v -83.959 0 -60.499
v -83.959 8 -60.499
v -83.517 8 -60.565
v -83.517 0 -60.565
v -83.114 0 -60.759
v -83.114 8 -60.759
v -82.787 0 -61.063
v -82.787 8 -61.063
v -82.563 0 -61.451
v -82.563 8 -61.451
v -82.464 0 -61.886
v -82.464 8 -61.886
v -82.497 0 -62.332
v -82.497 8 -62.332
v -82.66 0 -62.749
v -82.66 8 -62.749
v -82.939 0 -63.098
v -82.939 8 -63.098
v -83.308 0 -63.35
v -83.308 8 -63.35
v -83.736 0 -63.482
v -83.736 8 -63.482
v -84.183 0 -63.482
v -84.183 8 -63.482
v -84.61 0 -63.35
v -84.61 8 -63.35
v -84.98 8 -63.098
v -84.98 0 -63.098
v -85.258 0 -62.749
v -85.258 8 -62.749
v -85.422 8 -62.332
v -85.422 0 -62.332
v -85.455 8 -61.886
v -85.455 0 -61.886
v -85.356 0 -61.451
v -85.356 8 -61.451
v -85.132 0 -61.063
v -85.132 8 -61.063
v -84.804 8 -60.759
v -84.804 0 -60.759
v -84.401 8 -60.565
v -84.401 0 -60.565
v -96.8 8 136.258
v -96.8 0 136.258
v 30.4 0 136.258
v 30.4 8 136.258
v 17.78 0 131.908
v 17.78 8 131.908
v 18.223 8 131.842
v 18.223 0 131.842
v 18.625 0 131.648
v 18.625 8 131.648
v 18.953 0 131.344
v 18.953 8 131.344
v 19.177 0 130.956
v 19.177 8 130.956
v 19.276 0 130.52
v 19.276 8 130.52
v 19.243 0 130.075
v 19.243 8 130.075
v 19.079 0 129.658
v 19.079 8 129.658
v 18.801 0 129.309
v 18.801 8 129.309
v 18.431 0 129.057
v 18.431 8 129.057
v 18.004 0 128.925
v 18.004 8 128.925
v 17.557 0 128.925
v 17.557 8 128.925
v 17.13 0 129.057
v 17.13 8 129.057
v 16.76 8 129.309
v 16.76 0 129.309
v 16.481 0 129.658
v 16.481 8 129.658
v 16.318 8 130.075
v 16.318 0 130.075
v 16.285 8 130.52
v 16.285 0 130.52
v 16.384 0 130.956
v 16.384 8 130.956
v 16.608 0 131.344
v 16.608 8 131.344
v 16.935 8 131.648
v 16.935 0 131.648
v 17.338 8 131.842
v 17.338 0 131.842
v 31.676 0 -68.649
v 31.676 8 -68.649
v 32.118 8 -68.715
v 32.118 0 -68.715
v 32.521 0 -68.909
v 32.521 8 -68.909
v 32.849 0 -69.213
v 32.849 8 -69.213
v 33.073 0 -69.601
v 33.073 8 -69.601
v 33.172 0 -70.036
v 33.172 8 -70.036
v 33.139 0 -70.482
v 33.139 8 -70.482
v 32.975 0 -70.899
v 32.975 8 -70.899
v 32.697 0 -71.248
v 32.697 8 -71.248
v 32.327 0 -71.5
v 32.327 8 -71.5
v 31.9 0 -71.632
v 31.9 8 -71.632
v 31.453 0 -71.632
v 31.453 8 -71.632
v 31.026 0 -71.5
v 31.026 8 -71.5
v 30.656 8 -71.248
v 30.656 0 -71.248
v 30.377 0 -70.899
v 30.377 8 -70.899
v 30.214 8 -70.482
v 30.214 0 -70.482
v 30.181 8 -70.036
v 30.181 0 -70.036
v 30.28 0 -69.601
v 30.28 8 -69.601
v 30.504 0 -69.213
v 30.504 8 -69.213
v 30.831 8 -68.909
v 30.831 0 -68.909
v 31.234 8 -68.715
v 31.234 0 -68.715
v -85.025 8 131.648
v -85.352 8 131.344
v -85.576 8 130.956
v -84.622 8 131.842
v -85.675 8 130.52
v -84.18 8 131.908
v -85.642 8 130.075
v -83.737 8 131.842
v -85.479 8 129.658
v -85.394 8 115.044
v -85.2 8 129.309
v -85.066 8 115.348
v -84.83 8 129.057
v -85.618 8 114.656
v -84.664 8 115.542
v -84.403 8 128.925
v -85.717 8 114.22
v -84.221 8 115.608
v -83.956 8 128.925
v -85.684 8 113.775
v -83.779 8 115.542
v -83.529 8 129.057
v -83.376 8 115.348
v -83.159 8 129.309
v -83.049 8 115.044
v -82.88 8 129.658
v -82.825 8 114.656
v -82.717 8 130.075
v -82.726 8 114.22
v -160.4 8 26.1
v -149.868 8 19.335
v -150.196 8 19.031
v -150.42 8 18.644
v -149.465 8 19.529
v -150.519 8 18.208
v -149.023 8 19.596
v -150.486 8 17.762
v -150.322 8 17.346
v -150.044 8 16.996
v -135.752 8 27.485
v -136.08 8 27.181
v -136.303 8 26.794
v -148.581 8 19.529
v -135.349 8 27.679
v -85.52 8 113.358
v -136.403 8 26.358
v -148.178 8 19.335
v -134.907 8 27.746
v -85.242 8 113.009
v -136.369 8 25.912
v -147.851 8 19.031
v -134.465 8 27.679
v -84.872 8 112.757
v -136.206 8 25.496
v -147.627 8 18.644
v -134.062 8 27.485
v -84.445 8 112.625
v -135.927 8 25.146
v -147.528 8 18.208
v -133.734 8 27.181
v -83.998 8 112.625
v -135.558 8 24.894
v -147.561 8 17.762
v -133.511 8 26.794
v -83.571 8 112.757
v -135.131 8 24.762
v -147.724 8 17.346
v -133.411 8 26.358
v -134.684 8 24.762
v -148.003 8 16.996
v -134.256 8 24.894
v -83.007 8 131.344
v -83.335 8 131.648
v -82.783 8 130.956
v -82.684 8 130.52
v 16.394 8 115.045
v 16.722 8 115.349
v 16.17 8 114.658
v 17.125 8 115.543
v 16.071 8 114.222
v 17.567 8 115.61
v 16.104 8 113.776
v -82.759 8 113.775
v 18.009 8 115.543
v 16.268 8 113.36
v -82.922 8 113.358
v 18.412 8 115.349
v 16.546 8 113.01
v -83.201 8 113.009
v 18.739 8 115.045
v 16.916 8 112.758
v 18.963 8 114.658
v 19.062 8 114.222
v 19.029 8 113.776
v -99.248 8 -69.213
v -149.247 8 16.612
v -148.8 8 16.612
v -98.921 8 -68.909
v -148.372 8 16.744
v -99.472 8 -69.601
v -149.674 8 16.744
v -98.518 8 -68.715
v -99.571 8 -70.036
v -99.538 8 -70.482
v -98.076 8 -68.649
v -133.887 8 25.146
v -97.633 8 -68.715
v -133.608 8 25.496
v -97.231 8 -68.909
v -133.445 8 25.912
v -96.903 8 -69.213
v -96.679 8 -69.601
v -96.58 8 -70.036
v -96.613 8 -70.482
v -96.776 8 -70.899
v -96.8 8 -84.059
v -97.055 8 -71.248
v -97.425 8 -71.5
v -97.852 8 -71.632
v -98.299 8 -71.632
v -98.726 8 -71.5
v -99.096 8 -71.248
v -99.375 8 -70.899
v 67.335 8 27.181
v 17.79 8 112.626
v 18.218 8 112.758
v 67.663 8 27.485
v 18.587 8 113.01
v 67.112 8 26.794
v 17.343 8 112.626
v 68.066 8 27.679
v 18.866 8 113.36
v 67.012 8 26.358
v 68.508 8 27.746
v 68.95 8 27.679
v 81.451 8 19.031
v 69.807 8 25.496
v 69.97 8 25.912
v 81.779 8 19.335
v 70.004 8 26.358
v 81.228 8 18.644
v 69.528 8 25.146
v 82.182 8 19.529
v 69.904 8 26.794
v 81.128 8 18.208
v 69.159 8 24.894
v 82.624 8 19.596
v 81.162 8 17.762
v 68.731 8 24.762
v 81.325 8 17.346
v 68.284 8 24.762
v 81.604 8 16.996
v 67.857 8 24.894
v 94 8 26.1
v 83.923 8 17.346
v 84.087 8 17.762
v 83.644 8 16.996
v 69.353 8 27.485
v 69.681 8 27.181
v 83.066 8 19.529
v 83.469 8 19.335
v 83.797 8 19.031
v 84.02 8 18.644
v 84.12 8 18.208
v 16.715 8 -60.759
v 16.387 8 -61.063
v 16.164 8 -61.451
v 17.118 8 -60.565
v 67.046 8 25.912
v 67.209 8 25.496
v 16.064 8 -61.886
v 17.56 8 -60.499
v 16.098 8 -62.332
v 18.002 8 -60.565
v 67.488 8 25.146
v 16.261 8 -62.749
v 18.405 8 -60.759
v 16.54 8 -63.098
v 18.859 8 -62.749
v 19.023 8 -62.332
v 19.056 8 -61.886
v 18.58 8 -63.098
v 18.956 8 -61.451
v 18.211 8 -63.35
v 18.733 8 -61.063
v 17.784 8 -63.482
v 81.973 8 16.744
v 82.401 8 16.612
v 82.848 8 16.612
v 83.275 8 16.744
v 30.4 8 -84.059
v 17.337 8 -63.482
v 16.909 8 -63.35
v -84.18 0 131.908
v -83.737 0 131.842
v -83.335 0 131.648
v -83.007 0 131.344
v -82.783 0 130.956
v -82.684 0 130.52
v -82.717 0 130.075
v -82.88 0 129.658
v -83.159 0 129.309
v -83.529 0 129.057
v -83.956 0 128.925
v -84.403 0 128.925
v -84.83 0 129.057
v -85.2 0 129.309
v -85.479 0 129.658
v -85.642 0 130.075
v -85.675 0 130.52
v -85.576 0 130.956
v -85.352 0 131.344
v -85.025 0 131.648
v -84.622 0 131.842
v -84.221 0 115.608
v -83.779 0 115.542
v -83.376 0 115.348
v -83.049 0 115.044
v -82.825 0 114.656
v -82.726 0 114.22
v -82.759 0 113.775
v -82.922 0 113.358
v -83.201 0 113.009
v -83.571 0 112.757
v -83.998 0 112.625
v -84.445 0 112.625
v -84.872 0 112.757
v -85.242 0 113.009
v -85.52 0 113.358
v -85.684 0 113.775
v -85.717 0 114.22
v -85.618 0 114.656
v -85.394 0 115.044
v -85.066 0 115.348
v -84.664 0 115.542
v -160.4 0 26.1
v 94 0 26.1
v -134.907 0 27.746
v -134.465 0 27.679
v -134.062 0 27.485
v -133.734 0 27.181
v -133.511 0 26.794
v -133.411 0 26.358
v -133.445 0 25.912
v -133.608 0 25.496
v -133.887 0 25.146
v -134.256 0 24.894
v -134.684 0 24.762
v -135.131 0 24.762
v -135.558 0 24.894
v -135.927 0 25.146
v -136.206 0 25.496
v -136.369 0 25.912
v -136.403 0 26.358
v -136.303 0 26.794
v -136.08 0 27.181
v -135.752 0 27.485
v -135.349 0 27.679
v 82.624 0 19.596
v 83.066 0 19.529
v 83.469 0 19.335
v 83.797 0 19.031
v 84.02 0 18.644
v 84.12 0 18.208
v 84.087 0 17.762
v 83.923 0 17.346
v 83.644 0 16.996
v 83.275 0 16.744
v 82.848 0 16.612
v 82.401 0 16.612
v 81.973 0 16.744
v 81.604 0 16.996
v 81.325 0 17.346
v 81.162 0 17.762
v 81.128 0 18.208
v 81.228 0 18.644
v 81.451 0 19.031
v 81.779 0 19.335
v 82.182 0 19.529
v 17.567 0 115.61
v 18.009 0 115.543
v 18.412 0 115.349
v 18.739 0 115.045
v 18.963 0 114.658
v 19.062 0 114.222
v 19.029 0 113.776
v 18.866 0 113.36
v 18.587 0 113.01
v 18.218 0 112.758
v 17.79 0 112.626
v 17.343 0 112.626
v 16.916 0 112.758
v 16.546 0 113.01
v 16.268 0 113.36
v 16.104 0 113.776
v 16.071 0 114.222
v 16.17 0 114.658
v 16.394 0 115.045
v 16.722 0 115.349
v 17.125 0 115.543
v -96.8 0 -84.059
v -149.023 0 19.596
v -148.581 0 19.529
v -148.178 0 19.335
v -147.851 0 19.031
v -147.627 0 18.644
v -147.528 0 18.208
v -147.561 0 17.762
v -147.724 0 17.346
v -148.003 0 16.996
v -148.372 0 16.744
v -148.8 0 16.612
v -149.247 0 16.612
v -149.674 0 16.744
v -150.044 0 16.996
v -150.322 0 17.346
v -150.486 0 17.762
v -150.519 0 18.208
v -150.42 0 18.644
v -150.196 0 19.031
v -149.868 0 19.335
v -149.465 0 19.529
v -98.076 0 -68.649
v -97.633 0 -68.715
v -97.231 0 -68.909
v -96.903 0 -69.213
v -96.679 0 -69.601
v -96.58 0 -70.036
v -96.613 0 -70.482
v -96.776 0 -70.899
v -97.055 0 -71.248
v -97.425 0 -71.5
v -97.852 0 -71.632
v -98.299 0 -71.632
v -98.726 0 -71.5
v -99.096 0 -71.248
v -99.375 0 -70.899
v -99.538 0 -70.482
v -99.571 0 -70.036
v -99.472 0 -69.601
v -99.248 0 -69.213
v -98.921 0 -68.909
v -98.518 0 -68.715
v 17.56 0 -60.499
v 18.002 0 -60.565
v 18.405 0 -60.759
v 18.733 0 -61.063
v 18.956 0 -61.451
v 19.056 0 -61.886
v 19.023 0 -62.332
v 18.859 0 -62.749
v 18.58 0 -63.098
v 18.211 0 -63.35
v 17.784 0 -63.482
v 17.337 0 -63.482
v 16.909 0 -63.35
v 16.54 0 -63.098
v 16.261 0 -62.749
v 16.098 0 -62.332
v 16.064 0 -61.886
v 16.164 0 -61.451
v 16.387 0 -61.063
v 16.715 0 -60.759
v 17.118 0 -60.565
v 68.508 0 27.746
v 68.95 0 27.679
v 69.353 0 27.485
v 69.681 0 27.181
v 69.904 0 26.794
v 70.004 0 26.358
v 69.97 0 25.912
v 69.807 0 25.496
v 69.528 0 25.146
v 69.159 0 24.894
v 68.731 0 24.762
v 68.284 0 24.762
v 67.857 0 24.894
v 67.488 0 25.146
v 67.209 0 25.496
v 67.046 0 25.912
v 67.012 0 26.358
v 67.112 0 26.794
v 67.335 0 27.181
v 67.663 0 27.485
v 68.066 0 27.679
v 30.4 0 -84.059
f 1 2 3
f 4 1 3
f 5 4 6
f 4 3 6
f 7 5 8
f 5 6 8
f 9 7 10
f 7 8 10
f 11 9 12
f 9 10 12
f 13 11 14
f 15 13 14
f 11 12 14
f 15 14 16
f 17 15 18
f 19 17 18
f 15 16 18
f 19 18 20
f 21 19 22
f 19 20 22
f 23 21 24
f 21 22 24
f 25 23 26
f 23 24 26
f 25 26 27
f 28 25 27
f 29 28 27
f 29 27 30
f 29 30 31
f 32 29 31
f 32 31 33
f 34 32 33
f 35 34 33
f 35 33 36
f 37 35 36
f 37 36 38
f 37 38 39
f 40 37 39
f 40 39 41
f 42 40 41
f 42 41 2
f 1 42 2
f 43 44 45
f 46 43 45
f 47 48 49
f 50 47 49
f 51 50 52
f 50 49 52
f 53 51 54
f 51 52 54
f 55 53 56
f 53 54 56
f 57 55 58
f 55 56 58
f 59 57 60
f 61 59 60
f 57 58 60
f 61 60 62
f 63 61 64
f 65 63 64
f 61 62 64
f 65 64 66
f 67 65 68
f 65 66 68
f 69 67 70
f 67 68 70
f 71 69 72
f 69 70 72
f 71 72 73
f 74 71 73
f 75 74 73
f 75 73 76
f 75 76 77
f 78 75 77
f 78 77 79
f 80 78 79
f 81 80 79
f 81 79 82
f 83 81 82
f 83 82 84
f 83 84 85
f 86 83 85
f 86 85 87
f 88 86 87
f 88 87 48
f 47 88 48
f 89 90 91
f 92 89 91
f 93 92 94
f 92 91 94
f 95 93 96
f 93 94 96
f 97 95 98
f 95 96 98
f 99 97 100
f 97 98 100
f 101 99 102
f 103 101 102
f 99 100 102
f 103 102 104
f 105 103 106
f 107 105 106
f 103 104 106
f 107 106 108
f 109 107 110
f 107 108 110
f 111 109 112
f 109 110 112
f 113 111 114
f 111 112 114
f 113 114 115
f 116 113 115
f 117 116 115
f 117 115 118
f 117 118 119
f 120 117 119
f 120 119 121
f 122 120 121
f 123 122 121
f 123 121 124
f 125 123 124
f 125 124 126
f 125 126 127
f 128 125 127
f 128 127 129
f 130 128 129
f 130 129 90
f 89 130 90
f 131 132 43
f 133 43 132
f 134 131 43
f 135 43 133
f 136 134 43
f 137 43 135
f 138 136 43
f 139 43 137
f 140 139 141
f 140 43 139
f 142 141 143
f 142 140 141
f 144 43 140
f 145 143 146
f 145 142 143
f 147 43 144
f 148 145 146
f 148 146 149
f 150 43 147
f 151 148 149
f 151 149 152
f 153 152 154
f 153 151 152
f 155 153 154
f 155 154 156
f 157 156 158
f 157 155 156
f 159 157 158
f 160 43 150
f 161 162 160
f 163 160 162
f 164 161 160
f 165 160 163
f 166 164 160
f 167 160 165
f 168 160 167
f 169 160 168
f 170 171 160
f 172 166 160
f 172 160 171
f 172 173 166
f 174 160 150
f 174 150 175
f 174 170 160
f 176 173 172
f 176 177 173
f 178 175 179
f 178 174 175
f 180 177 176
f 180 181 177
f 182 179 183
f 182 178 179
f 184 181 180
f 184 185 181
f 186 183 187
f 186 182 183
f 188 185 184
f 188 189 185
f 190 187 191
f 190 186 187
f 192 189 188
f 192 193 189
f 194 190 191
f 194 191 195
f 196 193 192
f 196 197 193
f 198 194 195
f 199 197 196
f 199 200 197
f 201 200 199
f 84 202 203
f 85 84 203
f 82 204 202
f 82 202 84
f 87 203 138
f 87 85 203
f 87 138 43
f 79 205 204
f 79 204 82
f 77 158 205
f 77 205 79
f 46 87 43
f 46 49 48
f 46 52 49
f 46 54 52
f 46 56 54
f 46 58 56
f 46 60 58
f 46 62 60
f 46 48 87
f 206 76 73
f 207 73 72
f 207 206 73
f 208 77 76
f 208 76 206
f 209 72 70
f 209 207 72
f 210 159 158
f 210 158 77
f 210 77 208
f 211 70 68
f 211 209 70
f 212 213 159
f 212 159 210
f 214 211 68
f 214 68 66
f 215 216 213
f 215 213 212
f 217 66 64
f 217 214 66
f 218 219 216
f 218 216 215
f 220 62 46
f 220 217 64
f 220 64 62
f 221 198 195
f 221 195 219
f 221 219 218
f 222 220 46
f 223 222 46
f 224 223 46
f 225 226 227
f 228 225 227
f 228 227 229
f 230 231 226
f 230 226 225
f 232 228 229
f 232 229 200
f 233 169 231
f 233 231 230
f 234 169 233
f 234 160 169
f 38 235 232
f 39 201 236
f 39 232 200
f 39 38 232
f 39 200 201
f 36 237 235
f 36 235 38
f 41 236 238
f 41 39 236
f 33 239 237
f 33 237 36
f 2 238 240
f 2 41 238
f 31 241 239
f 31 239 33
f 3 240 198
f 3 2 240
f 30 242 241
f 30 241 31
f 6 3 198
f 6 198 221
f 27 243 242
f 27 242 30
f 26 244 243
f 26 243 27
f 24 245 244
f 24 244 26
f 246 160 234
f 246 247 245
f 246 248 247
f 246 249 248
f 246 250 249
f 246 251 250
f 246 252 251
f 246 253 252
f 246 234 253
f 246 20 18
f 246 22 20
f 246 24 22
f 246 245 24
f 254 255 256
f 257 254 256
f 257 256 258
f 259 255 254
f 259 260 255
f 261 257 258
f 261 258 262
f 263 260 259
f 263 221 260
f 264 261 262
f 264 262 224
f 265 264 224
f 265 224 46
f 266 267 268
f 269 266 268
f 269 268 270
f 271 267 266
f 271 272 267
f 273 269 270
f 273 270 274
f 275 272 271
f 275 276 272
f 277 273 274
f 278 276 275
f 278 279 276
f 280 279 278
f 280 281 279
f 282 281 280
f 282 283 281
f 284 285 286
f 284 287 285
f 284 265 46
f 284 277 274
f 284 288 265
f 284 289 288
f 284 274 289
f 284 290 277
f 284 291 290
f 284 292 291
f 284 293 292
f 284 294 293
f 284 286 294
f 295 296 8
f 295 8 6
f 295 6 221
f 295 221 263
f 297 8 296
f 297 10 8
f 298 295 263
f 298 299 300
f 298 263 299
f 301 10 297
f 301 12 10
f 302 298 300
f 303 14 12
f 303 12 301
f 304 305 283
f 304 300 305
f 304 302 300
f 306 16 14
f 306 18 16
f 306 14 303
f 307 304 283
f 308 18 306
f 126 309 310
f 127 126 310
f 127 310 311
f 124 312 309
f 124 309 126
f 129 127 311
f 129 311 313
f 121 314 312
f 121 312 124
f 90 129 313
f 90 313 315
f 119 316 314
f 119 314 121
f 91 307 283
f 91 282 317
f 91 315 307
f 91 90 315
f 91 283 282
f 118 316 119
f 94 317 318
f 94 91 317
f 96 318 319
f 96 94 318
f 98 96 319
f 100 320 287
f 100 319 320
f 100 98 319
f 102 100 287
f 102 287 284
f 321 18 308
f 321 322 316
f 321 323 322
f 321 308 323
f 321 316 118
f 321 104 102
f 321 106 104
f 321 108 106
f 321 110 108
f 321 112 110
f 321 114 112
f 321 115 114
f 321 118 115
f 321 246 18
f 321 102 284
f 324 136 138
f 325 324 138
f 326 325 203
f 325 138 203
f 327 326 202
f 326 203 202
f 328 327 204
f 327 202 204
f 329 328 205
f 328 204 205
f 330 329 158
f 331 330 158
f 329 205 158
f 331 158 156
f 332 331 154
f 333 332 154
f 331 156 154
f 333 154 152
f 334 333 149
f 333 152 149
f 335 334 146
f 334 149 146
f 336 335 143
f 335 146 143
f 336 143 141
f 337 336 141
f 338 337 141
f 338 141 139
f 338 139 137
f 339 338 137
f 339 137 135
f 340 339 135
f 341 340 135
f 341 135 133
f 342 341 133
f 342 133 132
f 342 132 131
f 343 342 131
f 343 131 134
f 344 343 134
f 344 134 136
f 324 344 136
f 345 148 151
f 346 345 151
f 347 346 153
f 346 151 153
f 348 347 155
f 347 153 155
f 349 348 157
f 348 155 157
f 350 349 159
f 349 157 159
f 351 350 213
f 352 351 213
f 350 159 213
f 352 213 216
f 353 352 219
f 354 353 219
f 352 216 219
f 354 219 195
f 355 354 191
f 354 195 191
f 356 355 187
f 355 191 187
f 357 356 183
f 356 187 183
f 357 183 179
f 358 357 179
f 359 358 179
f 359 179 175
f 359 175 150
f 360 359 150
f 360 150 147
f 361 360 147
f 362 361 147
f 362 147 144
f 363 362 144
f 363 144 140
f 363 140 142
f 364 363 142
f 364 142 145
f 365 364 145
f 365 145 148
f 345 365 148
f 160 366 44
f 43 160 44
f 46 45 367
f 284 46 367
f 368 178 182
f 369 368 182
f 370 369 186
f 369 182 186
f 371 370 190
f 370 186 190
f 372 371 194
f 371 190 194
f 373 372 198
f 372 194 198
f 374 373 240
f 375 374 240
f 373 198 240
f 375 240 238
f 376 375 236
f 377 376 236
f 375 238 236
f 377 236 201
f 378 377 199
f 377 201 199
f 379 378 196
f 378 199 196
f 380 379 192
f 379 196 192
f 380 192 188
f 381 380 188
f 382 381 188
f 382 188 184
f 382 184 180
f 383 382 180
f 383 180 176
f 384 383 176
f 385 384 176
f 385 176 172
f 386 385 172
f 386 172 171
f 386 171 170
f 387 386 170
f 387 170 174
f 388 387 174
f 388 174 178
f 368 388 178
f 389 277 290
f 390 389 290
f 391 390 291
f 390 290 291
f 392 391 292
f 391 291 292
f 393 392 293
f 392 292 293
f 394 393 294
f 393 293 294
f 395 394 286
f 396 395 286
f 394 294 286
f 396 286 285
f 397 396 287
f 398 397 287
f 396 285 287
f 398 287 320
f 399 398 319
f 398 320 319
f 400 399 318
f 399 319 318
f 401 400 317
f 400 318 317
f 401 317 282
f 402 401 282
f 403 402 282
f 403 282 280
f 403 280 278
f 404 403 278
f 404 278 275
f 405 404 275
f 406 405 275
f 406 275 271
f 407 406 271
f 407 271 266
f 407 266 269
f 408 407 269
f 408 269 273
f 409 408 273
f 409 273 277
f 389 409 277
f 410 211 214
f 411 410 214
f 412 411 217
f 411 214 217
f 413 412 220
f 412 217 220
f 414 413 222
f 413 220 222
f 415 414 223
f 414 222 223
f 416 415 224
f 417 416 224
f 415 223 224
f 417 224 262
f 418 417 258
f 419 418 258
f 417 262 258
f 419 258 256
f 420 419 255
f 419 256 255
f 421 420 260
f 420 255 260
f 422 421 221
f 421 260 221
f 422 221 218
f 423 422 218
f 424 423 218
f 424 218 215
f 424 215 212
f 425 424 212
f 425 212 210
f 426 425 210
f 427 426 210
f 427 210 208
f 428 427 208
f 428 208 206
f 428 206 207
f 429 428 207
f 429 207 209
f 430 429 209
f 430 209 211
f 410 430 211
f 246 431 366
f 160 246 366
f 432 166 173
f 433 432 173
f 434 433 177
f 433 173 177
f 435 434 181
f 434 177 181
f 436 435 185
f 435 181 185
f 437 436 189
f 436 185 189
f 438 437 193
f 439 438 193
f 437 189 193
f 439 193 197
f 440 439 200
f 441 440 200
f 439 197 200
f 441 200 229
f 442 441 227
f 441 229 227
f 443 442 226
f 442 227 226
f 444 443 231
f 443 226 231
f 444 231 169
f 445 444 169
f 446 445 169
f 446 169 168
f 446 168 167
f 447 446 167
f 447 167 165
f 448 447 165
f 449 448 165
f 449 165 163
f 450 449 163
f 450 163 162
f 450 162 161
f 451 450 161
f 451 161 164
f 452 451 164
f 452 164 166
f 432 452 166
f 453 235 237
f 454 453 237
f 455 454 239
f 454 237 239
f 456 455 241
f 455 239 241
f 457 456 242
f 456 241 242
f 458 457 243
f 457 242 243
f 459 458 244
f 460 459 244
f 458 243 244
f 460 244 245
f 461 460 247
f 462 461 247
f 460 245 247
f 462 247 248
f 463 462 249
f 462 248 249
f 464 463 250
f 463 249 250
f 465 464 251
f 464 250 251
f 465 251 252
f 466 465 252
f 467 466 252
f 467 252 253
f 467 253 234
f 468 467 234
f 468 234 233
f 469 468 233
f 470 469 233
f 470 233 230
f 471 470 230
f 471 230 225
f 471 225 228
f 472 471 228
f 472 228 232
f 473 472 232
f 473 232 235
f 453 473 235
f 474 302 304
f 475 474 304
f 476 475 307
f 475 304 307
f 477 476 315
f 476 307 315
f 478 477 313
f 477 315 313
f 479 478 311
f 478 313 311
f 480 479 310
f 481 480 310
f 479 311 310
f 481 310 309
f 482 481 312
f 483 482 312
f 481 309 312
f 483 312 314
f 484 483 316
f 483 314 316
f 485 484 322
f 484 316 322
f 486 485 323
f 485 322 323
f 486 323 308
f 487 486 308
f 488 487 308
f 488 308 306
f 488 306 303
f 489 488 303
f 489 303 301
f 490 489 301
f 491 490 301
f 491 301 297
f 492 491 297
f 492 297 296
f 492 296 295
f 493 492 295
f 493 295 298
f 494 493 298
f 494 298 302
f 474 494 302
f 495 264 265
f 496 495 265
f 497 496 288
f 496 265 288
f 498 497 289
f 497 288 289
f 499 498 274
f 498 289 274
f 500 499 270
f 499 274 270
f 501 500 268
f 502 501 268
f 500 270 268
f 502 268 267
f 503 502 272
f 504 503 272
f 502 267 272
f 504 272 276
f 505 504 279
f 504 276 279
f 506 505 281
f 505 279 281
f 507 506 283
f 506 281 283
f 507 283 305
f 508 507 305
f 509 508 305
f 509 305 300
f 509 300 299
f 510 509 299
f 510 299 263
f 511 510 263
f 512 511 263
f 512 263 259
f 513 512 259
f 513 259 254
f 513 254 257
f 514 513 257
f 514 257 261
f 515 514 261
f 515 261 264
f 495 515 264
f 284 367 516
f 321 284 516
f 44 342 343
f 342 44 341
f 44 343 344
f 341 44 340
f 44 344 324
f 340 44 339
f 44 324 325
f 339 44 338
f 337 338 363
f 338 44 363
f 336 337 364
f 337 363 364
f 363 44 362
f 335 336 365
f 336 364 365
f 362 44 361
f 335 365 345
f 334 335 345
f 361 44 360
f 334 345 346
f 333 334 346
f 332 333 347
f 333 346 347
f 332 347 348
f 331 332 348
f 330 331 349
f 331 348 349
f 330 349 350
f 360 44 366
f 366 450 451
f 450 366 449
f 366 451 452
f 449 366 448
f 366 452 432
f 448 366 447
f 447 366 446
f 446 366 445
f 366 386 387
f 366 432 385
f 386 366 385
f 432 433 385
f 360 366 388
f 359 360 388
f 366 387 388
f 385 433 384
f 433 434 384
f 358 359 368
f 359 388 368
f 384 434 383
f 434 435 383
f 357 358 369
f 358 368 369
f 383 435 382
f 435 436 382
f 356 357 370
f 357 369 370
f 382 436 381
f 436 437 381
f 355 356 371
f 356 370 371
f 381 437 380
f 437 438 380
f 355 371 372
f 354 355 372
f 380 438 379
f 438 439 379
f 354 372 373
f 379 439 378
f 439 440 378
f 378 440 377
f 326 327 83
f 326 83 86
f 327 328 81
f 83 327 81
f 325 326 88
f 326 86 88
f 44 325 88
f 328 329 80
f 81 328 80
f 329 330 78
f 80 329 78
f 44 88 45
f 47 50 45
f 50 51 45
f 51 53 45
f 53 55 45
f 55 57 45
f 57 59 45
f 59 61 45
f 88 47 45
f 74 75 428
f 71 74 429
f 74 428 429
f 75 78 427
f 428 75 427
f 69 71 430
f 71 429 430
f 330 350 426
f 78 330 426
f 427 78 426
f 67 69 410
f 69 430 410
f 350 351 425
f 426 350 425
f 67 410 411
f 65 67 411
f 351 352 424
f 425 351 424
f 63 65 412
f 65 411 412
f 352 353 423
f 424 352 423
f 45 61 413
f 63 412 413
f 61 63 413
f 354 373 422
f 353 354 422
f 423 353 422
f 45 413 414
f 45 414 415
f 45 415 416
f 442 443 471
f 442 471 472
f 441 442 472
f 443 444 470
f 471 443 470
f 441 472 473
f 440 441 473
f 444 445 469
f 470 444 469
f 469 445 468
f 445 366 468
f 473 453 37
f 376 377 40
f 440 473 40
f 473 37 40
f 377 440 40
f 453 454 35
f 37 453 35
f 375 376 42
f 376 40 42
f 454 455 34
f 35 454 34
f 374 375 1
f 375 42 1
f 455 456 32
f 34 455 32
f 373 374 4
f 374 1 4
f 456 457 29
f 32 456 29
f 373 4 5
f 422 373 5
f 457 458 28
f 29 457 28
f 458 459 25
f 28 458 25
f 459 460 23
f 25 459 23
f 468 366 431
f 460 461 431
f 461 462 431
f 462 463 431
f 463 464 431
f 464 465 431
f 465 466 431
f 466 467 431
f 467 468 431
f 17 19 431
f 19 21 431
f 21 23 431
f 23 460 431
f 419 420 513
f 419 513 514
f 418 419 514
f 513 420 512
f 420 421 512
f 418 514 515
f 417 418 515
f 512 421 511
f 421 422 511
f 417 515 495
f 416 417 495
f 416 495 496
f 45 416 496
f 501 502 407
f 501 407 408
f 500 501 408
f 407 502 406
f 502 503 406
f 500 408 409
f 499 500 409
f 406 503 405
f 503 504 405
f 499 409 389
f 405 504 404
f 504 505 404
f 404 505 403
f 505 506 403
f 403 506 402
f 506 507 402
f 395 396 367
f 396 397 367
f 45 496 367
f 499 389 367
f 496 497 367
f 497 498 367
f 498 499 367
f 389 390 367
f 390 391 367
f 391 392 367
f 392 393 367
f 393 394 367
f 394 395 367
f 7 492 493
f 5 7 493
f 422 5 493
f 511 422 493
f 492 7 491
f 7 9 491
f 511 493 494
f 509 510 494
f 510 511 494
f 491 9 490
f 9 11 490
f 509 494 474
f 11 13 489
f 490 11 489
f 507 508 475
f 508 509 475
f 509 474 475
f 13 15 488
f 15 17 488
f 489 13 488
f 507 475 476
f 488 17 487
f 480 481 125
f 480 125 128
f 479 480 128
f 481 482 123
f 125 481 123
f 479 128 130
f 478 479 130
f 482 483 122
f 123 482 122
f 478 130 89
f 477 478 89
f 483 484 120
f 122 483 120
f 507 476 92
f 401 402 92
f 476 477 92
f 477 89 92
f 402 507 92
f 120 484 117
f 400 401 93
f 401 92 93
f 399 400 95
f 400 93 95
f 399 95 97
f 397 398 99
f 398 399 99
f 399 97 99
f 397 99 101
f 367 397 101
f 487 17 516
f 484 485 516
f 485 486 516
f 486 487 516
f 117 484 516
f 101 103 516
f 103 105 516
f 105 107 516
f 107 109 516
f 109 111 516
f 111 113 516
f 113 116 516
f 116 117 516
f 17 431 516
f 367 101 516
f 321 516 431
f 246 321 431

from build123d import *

# Parameters (mm, degrees)
BOSS_EXTRUDE2_DEPTH = 8
SKETCH2_R           = 1.5
CUT_EXTRUDE1_DEPTH  = 211.61424354


with BuildPart() as part:
    # Sketch1 → Boss-Extrude2 (new body)
    with BuildSketch(Plane(origin=(0, 0, 0), x_dir=(1, 0, 0), z_dir=(0, 1, 0))):
        Polygon((94.000414938, -26.09989937), (30.400414938, 84.058531992), (-96.799585062, 84.058531992), (-160.399585062, -26.09989937), (-96.799585062, -136.258330731), (30.400414938, -136.258330731), align=None)
    extrude(amount=BOSS_EXTRUDE2_DEPTH)

    # Sketch2 → Cut-Extrude1 (cut, through all)
    with BuildSketch(Plane(origin=(0, 8, 0), x_dir=(1, 0, 0), z_dir=(0, 1, 0))):
        with Locations(Location((17.780367394, -130.408330731, 0), (0, 0, 270))):
            Circle(SKETCH2_R)
        with Locations(Location((-84.179537519, -130.408330731, 0), (0, 0, 270))):
            Circle(SKETCH2_R)
        with Locations(Location((-84.221416865, -114.108384531, 0), (0, 0, 270))):
            Circle(SKETCH2_R)
        with Locations(Location((17.566684484, -114.109731417, 0), (0, 0, 270))):
            Circle(SKETCH2_R)
        with Locations(Location((82.624142554, -18.0956176, 0), (0, 0, 270))):
            Circle(SKETCH2_R)
        with Locations(Location((68.507928472, -26.2456176, 0), (0, 0, 270))):
            Circle(SKETCH2_R)
        with Locations(Location((31.676359033, 70.148531992, 0), (0, 0, 270))):
            Circle(SKETCH2_R)
        with Locations(Location((17.560144951, 61.998531992, 0), (0, 0, 270))):
            Circle(SKETCH2_R)
        with Locations(Location((-98.075529157, 70.148531992, 0), (0, 0, 270))):
            Circle(SKETCH2_R)
        with Locations(Location((-83.959315075, 61.998531992, 0), (0, 0, 270))):
            Circle(SKETCH2_R)
        with Locations(Location((-149.023312678, -18.0956176, 0), (0, 0, 270))):
            Circle(SKETCH2_R)
        with Locations(Location((-134.907098597, -26.2456176, 0), (0, 0, 270))):
            Circle(SKETCH2_R)
    extrude(amount=-CUT_EXTRUDE1_DEPTH, mode=Mode.SUBTRACT)


solid = part.part
